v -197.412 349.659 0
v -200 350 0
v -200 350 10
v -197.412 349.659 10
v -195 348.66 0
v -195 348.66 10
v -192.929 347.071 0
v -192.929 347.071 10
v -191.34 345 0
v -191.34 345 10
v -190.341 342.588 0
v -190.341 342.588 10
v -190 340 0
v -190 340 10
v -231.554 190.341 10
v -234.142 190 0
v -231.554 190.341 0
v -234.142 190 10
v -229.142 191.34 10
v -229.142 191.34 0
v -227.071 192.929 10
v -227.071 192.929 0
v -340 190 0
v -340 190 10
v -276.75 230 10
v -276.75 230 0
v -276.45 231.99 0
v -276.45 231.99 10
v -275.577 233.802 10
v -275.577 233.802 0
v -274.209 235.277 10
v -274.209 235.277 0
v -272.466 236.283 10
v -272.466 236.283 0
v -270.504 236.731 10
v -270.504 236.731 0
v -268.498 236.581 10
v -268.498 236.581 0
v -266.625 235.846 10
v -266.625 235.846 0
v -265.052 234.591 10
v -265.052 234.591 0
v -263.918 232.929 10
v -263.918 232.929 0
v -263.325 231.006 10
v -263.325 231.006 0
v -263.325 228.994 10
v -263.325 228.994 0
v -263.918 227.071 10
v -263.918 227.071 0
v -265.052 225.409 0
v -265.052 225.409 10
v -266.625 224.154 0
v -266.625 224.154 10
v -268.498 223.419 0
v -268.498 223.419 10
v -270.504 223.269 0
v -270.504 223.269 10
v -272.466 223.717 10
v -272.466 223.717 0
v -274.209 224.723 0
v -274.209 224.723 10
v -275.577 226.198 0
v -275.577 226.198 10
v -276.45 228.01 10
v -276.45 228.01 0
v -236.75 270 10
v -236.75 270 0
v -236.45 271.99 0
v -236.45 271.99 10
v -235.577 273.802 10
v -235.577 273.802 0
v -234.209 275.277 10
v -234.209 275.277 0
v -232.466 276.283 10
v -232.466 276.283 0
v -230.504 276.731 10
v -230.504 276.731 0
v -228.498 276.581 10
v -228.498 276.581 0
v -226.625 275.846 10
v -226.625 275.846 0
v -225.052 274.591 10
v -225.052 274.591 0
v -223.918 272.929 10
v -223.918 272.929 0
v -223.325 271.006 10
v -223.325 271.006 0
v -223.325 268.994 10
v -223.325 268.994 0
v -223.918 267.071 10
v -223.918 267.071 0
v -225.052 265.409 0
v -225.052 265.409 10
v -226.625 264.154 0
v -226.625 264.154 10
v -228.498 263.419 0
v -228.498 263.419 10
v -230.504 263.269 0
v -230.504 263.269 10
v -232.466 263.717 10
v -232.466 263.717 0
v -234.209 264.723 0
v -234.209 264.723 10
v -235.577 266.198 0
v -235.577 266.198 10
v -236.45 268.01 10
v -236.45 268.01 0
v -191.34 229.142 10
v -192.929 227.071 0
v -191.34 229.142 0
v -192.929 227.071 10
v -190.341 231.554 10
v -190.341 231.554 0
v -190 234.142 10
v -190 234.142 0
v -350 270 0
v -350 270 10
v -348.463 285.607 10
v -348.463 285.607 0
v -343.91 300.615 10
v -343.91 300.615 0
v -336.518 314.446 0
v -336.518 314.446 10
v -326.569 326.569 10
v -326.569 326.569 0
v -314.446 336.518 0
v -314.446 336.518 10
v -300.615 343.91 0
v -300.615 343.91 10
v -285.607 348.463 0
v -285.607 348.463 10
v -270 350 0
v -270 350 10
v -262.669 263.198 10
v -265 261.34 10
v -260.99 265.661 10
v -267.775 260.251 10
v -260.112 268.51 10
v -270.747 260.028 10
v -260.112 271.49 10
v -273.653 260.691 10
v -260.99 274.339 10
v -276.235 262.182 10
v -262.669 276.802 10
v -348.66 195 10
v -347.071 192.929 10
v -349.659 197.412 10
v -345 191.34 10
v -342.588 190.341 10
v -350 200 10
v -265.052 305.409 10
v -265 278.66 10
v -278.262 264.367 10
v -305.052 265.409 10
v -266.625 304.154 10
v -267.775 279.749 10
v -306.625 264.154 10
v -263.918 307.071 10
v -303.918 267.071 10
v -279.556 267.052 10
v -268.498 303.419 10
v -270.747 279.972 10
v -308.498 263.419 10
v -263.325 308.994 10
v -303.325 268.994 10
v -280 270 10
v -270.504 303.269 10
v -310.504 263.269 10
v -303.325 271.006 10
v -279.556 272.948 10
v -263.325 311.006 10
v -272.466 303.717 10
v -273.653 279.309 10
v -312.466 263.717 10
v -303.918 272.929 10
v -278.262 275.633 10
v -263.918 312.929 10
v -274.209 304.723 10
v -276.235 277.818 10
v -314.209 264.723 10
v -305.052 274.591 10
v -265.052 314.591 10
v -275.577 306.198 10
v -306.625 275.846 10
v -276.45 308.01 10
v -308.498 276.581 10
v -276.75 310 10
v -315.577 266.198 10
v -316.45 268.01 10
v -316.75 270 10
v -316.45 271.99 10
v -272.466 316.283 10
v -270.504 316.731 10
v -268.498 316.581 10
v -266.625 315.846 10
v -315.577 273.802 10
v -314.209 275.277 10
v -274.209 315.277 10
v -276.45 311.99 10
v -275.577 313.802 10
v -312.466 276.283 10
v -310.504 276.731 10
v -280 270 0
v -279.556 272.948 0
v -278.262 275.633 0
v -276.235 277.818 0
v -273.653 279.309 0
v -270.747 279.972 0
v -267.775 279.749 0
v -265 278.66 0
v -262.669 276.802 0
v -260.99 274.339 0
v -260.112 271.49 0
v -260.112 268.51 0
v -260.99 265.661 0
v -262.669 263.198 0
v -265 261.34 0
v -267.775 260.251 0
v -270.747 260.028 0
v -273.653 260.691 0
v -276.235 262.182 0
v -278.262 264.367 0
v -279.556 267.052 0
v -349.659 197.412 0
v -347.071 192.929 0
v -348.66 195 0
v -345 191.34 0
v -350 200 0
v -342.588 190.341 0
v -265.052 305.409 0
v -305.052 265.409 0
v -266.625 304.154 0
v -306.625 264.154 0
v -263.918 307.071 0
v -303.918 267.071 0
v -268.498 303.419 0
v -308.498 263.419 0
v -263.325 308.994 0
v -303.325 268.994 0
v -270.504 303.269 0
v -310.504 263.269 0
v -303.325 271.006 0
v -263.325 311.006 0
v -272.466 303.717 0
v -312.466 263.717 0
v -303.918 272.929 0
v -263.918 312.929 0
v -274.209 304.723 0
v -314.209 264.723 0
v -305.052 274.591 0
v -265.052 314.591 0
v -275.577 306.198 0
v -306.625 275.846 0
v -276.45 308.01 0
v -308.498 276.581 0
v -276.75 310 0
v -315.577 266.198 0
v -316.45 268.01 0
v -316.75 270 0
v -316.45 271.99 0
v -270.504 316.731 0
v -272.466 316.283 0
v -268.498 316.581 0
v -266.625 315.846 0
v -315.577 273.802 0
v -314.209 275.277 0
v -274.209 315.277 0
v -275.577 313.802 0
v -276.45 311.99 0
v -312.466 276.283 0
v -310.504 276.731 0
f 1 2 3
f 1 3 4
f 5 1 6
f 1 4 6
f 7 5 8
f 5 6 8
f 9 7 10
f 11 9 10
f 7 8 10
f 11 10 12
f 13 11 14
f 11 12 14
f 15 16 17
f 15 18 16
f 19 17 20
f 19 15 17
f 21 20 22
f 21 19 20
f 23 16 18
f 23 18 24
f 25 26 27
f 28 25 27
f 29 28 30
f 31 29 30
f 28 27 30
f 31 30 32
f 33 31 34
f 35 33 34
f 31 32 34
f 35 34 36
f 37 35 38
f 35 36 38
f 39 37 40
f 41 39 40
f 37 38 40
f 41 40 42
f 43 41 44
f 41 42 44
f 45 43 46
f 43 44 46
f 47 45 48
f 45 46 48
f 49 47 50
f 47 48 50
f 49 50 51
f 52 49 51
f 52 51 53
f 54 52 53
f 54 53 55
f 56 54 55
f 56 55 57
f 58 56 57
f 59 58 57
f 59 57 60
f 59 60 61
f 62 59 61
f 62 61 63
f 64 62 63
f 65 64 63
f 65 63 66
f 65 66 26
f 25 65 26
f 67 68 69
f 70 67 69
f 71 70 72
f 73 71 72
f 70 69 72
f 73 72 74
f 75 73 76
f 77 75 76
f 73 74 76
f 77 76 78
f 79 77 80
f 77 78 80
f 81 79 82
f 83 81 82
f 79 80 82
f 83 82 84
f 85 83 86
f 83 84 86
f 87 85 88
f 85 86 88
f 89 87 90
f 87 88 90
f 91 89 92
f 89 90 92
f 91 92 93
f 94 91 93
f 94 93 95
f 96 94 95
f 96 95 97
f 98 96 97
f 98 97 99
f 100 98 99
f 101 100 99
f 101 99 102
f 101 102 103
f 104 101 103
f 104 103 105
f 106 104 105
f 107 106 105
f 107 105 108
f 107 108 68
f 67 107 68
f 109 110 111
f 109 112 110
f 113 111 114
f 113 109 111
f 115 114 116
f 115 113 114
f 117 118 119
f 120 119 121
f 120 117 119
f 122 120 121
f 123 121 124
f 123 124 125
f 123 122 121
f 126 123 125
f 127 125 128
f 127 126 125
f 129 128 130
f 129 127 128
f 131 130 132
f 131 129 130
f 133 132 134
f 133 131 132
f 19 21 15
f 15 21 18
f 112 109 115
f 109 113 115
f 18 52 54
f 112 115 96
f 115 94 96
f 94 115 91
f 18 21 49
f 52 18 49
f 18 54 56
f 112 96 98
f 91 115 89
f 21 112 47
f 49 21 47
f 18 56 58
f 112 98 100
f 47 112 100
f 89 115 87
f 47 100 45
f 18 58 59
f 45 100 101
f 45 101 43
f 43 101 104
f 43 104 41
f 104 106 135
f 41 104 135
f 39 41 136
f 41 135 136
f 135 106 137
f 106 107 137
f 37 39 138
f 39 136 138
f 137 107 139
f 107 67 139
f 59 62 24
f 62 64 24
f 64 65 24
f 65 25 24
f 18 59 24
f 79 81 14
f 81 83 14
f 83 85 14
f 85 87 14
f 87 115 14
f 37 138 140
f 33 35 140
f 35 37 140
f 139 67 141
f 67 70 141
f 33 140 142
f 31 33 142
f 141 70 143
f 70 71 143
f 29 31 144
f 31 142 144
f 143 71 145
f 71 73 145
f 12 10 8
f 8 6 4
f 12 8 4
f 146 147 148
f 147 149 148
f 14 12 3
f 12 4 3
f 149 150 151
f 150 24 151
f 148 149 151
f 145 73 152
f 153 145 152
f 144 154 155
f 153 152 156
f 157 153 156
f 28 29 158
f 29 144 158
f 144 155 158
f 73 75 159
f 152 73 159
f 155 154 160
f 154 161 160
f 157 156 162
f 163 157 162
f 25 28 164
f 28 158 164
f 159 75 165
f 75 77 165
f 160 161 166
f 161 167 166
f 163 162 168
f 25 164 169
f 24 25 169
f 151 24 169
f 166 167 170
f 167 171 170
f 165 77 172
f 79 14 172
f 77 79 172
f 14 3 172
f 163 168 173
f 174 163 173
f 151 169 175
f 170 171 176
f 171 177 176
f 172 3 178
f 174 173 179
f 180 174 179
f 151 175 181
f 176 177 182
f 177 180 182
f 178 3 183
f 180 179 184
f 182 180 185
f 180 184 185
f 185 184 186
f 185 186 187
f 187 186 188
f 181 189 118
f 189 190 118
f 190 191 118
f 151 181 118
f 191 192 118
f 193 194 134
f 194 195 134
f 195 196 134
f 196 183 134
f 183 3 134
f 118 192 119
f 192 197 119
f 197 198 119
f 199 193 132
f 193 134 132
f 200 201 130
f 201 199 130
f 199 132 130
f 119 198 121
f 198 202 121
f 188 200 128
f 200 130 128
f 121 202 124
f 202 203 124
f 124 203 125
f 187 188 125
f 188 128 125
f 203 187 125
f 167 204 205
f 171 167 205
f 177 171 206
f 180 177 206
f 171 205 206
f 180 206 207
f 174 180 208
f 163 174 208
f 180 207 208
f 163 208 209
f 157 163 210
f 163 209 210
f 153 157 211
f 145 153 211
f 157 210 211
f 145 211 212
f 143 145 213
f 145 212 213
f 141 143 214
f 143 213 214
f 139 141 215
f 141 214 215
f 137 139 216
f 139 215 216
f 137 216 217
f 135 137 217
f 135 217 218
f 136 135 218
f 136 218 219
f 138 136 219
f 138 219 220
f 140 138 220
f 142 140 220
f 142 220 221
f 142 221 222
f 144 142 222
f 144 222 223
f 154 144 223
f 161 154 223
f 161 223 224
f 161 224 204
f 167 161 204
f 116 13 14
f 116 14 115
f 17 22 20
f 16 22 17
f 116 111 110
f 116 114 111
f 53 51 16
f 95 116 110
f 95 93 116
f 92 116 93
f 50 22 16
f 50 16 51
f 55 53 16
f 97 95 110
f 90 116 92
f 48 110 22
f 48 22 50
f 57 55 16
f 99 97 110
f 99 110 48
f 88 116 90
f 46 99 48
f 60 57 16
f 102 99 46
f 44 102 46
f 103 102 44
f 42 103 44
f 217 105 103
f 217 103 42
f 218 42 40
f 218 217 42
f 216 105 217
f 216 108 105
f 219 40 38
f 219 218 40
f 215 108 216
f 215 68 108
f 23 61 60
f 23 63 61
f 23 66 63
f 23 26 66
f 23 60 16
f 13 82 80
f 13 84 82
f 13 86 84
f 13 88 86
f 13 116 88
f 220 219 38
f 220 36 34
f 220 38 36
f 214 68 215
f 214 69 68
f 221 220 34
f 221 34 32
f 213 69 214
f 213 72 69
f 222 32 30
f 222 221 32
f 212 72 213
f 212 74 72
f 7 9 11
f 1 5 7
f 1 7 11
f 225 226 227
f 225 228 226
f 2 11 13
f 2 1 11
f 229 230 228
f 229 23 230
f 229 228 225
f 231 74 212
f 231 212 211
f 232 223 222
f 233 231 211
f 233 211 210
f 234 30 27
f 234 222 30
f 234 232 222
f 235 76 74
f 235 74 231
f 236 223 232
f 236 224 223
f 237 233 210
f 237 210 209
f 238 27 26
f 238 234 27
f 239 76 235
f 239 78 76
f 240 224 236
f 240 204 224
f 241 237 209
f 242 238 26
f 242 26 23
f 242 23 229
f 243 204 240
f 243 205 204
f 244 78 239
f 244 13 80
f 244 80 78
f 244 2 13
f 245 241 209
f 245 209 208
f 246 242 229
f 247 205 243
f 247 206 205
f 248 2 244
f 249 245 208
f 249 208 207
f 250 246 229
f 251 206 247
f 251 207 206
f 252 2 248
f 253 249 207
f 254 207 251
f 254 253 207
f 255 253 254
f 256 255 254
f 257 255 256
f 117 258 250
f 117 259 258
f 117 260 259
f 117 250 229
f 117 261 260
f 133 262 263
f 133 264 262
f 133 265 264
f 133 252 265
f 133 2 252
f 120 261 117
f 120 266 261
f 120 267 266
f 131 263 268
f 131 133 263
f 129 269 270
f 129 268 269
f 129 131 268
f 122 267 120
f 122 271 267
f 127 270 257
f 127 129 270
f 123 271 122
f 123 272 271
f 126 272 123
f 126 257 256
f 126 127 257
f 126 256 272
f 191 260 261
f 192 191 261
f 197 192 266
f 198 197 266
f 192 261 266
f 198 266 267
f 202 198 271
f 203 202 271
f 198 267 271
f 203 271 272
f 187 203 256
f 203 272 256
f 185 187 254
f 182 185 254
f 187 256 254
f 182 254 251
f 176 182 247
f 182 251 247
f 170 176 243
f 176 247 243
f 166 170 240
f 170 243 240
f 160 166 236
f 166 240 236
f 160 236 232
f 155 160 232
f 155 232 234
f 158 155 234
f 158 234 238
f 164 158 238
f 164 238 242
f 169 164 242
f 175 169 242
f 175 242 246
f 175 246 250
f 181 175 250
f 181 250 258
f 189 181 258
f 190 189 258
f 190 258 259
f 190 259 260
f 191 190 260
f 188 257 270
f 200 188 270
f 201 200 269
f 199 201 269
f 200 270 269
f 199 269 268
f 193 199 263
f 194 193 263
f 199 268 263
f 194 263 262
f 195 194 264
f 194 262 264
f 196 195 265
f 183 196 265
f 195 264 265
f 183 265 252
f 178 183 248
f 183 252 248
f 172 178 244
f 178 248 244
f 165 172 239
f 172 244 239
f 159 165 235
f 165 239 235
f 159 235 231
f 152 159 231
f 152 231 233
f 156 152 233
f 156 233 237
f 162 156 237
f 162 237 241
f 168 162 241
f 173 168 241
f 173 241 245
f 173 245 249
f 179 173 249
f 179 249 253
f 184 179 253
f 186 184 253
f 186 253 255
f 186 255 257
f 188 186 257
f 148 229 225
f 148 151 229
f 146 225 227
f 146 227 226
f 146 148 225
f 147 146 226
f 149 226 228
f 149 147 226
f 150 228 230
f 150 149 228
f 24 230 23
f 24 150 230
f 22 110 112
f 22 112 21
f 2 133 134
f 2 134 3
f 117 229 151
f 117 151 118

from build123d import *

# Parameters (mm, degrees)
BASE_FLANGE1_DEPTH = 10
SKETCH6_R          = 6.75
SKETCH6_R_2        = 10
CUT_EXTRUDE1_DEPTH = 496.075751779
FILLET1_R          = 10


# Sheet-metal steps are written as plain solids
with BuildPart() as part:
    # Sketch1 → Base-Flange1 (new body)
    with BuildSketch(Plane.XY):
        with BuildLine():
            Line((-350, 190), (-350, 270))
            ThreePointArc((-350, 270), (-326.568542495, 326.568542495), (-270, 350))
            Line((-270, 350), (-190, 350))
            Line((-190, 350), (-190, 230))
            Line((-190, 230), (-230, 190))
            Line((-230, 190), (-350, 190))
        make_face()
    extrude(amount=BASE_FLANGE1_DEPTH)

    # Sketch6 → Cut-Extrude1 (cut, through all)
    with BuildSketch(Plane(origin=(0, 0, 0), x_dir=(-1, 0, 0), z_dir=(0, 0, -1))):
        with Locations((270, 310)):
            Circle(SKETCH6_R)
        with Locations((310, 270)):
            Circle(SKETCH6_R)
        with Locations((230, 270)):
            Circle(SKETCH6_R)
        with Locations((270, 230)):
            Circle(SKETCH6_R)
        with Locations((270, 270)):
            Circle(SKETCH6_R_2)
    extrude(amount=-CUT_EXTRUDE1_DEPTH, mode=Mode.SUBTRACT)

    # Fillet1
    fillet1_edges = [part.edges().sort_by_distance(p)[0] for p in [
        (-190, 350, 5),
        (-190, 230, 5),
        (-230, 190, 5),
        (-350, 190, 5),
    ]]
    fillet(fillet1_edges, radius=FILLET1_R)


solid = part.part
